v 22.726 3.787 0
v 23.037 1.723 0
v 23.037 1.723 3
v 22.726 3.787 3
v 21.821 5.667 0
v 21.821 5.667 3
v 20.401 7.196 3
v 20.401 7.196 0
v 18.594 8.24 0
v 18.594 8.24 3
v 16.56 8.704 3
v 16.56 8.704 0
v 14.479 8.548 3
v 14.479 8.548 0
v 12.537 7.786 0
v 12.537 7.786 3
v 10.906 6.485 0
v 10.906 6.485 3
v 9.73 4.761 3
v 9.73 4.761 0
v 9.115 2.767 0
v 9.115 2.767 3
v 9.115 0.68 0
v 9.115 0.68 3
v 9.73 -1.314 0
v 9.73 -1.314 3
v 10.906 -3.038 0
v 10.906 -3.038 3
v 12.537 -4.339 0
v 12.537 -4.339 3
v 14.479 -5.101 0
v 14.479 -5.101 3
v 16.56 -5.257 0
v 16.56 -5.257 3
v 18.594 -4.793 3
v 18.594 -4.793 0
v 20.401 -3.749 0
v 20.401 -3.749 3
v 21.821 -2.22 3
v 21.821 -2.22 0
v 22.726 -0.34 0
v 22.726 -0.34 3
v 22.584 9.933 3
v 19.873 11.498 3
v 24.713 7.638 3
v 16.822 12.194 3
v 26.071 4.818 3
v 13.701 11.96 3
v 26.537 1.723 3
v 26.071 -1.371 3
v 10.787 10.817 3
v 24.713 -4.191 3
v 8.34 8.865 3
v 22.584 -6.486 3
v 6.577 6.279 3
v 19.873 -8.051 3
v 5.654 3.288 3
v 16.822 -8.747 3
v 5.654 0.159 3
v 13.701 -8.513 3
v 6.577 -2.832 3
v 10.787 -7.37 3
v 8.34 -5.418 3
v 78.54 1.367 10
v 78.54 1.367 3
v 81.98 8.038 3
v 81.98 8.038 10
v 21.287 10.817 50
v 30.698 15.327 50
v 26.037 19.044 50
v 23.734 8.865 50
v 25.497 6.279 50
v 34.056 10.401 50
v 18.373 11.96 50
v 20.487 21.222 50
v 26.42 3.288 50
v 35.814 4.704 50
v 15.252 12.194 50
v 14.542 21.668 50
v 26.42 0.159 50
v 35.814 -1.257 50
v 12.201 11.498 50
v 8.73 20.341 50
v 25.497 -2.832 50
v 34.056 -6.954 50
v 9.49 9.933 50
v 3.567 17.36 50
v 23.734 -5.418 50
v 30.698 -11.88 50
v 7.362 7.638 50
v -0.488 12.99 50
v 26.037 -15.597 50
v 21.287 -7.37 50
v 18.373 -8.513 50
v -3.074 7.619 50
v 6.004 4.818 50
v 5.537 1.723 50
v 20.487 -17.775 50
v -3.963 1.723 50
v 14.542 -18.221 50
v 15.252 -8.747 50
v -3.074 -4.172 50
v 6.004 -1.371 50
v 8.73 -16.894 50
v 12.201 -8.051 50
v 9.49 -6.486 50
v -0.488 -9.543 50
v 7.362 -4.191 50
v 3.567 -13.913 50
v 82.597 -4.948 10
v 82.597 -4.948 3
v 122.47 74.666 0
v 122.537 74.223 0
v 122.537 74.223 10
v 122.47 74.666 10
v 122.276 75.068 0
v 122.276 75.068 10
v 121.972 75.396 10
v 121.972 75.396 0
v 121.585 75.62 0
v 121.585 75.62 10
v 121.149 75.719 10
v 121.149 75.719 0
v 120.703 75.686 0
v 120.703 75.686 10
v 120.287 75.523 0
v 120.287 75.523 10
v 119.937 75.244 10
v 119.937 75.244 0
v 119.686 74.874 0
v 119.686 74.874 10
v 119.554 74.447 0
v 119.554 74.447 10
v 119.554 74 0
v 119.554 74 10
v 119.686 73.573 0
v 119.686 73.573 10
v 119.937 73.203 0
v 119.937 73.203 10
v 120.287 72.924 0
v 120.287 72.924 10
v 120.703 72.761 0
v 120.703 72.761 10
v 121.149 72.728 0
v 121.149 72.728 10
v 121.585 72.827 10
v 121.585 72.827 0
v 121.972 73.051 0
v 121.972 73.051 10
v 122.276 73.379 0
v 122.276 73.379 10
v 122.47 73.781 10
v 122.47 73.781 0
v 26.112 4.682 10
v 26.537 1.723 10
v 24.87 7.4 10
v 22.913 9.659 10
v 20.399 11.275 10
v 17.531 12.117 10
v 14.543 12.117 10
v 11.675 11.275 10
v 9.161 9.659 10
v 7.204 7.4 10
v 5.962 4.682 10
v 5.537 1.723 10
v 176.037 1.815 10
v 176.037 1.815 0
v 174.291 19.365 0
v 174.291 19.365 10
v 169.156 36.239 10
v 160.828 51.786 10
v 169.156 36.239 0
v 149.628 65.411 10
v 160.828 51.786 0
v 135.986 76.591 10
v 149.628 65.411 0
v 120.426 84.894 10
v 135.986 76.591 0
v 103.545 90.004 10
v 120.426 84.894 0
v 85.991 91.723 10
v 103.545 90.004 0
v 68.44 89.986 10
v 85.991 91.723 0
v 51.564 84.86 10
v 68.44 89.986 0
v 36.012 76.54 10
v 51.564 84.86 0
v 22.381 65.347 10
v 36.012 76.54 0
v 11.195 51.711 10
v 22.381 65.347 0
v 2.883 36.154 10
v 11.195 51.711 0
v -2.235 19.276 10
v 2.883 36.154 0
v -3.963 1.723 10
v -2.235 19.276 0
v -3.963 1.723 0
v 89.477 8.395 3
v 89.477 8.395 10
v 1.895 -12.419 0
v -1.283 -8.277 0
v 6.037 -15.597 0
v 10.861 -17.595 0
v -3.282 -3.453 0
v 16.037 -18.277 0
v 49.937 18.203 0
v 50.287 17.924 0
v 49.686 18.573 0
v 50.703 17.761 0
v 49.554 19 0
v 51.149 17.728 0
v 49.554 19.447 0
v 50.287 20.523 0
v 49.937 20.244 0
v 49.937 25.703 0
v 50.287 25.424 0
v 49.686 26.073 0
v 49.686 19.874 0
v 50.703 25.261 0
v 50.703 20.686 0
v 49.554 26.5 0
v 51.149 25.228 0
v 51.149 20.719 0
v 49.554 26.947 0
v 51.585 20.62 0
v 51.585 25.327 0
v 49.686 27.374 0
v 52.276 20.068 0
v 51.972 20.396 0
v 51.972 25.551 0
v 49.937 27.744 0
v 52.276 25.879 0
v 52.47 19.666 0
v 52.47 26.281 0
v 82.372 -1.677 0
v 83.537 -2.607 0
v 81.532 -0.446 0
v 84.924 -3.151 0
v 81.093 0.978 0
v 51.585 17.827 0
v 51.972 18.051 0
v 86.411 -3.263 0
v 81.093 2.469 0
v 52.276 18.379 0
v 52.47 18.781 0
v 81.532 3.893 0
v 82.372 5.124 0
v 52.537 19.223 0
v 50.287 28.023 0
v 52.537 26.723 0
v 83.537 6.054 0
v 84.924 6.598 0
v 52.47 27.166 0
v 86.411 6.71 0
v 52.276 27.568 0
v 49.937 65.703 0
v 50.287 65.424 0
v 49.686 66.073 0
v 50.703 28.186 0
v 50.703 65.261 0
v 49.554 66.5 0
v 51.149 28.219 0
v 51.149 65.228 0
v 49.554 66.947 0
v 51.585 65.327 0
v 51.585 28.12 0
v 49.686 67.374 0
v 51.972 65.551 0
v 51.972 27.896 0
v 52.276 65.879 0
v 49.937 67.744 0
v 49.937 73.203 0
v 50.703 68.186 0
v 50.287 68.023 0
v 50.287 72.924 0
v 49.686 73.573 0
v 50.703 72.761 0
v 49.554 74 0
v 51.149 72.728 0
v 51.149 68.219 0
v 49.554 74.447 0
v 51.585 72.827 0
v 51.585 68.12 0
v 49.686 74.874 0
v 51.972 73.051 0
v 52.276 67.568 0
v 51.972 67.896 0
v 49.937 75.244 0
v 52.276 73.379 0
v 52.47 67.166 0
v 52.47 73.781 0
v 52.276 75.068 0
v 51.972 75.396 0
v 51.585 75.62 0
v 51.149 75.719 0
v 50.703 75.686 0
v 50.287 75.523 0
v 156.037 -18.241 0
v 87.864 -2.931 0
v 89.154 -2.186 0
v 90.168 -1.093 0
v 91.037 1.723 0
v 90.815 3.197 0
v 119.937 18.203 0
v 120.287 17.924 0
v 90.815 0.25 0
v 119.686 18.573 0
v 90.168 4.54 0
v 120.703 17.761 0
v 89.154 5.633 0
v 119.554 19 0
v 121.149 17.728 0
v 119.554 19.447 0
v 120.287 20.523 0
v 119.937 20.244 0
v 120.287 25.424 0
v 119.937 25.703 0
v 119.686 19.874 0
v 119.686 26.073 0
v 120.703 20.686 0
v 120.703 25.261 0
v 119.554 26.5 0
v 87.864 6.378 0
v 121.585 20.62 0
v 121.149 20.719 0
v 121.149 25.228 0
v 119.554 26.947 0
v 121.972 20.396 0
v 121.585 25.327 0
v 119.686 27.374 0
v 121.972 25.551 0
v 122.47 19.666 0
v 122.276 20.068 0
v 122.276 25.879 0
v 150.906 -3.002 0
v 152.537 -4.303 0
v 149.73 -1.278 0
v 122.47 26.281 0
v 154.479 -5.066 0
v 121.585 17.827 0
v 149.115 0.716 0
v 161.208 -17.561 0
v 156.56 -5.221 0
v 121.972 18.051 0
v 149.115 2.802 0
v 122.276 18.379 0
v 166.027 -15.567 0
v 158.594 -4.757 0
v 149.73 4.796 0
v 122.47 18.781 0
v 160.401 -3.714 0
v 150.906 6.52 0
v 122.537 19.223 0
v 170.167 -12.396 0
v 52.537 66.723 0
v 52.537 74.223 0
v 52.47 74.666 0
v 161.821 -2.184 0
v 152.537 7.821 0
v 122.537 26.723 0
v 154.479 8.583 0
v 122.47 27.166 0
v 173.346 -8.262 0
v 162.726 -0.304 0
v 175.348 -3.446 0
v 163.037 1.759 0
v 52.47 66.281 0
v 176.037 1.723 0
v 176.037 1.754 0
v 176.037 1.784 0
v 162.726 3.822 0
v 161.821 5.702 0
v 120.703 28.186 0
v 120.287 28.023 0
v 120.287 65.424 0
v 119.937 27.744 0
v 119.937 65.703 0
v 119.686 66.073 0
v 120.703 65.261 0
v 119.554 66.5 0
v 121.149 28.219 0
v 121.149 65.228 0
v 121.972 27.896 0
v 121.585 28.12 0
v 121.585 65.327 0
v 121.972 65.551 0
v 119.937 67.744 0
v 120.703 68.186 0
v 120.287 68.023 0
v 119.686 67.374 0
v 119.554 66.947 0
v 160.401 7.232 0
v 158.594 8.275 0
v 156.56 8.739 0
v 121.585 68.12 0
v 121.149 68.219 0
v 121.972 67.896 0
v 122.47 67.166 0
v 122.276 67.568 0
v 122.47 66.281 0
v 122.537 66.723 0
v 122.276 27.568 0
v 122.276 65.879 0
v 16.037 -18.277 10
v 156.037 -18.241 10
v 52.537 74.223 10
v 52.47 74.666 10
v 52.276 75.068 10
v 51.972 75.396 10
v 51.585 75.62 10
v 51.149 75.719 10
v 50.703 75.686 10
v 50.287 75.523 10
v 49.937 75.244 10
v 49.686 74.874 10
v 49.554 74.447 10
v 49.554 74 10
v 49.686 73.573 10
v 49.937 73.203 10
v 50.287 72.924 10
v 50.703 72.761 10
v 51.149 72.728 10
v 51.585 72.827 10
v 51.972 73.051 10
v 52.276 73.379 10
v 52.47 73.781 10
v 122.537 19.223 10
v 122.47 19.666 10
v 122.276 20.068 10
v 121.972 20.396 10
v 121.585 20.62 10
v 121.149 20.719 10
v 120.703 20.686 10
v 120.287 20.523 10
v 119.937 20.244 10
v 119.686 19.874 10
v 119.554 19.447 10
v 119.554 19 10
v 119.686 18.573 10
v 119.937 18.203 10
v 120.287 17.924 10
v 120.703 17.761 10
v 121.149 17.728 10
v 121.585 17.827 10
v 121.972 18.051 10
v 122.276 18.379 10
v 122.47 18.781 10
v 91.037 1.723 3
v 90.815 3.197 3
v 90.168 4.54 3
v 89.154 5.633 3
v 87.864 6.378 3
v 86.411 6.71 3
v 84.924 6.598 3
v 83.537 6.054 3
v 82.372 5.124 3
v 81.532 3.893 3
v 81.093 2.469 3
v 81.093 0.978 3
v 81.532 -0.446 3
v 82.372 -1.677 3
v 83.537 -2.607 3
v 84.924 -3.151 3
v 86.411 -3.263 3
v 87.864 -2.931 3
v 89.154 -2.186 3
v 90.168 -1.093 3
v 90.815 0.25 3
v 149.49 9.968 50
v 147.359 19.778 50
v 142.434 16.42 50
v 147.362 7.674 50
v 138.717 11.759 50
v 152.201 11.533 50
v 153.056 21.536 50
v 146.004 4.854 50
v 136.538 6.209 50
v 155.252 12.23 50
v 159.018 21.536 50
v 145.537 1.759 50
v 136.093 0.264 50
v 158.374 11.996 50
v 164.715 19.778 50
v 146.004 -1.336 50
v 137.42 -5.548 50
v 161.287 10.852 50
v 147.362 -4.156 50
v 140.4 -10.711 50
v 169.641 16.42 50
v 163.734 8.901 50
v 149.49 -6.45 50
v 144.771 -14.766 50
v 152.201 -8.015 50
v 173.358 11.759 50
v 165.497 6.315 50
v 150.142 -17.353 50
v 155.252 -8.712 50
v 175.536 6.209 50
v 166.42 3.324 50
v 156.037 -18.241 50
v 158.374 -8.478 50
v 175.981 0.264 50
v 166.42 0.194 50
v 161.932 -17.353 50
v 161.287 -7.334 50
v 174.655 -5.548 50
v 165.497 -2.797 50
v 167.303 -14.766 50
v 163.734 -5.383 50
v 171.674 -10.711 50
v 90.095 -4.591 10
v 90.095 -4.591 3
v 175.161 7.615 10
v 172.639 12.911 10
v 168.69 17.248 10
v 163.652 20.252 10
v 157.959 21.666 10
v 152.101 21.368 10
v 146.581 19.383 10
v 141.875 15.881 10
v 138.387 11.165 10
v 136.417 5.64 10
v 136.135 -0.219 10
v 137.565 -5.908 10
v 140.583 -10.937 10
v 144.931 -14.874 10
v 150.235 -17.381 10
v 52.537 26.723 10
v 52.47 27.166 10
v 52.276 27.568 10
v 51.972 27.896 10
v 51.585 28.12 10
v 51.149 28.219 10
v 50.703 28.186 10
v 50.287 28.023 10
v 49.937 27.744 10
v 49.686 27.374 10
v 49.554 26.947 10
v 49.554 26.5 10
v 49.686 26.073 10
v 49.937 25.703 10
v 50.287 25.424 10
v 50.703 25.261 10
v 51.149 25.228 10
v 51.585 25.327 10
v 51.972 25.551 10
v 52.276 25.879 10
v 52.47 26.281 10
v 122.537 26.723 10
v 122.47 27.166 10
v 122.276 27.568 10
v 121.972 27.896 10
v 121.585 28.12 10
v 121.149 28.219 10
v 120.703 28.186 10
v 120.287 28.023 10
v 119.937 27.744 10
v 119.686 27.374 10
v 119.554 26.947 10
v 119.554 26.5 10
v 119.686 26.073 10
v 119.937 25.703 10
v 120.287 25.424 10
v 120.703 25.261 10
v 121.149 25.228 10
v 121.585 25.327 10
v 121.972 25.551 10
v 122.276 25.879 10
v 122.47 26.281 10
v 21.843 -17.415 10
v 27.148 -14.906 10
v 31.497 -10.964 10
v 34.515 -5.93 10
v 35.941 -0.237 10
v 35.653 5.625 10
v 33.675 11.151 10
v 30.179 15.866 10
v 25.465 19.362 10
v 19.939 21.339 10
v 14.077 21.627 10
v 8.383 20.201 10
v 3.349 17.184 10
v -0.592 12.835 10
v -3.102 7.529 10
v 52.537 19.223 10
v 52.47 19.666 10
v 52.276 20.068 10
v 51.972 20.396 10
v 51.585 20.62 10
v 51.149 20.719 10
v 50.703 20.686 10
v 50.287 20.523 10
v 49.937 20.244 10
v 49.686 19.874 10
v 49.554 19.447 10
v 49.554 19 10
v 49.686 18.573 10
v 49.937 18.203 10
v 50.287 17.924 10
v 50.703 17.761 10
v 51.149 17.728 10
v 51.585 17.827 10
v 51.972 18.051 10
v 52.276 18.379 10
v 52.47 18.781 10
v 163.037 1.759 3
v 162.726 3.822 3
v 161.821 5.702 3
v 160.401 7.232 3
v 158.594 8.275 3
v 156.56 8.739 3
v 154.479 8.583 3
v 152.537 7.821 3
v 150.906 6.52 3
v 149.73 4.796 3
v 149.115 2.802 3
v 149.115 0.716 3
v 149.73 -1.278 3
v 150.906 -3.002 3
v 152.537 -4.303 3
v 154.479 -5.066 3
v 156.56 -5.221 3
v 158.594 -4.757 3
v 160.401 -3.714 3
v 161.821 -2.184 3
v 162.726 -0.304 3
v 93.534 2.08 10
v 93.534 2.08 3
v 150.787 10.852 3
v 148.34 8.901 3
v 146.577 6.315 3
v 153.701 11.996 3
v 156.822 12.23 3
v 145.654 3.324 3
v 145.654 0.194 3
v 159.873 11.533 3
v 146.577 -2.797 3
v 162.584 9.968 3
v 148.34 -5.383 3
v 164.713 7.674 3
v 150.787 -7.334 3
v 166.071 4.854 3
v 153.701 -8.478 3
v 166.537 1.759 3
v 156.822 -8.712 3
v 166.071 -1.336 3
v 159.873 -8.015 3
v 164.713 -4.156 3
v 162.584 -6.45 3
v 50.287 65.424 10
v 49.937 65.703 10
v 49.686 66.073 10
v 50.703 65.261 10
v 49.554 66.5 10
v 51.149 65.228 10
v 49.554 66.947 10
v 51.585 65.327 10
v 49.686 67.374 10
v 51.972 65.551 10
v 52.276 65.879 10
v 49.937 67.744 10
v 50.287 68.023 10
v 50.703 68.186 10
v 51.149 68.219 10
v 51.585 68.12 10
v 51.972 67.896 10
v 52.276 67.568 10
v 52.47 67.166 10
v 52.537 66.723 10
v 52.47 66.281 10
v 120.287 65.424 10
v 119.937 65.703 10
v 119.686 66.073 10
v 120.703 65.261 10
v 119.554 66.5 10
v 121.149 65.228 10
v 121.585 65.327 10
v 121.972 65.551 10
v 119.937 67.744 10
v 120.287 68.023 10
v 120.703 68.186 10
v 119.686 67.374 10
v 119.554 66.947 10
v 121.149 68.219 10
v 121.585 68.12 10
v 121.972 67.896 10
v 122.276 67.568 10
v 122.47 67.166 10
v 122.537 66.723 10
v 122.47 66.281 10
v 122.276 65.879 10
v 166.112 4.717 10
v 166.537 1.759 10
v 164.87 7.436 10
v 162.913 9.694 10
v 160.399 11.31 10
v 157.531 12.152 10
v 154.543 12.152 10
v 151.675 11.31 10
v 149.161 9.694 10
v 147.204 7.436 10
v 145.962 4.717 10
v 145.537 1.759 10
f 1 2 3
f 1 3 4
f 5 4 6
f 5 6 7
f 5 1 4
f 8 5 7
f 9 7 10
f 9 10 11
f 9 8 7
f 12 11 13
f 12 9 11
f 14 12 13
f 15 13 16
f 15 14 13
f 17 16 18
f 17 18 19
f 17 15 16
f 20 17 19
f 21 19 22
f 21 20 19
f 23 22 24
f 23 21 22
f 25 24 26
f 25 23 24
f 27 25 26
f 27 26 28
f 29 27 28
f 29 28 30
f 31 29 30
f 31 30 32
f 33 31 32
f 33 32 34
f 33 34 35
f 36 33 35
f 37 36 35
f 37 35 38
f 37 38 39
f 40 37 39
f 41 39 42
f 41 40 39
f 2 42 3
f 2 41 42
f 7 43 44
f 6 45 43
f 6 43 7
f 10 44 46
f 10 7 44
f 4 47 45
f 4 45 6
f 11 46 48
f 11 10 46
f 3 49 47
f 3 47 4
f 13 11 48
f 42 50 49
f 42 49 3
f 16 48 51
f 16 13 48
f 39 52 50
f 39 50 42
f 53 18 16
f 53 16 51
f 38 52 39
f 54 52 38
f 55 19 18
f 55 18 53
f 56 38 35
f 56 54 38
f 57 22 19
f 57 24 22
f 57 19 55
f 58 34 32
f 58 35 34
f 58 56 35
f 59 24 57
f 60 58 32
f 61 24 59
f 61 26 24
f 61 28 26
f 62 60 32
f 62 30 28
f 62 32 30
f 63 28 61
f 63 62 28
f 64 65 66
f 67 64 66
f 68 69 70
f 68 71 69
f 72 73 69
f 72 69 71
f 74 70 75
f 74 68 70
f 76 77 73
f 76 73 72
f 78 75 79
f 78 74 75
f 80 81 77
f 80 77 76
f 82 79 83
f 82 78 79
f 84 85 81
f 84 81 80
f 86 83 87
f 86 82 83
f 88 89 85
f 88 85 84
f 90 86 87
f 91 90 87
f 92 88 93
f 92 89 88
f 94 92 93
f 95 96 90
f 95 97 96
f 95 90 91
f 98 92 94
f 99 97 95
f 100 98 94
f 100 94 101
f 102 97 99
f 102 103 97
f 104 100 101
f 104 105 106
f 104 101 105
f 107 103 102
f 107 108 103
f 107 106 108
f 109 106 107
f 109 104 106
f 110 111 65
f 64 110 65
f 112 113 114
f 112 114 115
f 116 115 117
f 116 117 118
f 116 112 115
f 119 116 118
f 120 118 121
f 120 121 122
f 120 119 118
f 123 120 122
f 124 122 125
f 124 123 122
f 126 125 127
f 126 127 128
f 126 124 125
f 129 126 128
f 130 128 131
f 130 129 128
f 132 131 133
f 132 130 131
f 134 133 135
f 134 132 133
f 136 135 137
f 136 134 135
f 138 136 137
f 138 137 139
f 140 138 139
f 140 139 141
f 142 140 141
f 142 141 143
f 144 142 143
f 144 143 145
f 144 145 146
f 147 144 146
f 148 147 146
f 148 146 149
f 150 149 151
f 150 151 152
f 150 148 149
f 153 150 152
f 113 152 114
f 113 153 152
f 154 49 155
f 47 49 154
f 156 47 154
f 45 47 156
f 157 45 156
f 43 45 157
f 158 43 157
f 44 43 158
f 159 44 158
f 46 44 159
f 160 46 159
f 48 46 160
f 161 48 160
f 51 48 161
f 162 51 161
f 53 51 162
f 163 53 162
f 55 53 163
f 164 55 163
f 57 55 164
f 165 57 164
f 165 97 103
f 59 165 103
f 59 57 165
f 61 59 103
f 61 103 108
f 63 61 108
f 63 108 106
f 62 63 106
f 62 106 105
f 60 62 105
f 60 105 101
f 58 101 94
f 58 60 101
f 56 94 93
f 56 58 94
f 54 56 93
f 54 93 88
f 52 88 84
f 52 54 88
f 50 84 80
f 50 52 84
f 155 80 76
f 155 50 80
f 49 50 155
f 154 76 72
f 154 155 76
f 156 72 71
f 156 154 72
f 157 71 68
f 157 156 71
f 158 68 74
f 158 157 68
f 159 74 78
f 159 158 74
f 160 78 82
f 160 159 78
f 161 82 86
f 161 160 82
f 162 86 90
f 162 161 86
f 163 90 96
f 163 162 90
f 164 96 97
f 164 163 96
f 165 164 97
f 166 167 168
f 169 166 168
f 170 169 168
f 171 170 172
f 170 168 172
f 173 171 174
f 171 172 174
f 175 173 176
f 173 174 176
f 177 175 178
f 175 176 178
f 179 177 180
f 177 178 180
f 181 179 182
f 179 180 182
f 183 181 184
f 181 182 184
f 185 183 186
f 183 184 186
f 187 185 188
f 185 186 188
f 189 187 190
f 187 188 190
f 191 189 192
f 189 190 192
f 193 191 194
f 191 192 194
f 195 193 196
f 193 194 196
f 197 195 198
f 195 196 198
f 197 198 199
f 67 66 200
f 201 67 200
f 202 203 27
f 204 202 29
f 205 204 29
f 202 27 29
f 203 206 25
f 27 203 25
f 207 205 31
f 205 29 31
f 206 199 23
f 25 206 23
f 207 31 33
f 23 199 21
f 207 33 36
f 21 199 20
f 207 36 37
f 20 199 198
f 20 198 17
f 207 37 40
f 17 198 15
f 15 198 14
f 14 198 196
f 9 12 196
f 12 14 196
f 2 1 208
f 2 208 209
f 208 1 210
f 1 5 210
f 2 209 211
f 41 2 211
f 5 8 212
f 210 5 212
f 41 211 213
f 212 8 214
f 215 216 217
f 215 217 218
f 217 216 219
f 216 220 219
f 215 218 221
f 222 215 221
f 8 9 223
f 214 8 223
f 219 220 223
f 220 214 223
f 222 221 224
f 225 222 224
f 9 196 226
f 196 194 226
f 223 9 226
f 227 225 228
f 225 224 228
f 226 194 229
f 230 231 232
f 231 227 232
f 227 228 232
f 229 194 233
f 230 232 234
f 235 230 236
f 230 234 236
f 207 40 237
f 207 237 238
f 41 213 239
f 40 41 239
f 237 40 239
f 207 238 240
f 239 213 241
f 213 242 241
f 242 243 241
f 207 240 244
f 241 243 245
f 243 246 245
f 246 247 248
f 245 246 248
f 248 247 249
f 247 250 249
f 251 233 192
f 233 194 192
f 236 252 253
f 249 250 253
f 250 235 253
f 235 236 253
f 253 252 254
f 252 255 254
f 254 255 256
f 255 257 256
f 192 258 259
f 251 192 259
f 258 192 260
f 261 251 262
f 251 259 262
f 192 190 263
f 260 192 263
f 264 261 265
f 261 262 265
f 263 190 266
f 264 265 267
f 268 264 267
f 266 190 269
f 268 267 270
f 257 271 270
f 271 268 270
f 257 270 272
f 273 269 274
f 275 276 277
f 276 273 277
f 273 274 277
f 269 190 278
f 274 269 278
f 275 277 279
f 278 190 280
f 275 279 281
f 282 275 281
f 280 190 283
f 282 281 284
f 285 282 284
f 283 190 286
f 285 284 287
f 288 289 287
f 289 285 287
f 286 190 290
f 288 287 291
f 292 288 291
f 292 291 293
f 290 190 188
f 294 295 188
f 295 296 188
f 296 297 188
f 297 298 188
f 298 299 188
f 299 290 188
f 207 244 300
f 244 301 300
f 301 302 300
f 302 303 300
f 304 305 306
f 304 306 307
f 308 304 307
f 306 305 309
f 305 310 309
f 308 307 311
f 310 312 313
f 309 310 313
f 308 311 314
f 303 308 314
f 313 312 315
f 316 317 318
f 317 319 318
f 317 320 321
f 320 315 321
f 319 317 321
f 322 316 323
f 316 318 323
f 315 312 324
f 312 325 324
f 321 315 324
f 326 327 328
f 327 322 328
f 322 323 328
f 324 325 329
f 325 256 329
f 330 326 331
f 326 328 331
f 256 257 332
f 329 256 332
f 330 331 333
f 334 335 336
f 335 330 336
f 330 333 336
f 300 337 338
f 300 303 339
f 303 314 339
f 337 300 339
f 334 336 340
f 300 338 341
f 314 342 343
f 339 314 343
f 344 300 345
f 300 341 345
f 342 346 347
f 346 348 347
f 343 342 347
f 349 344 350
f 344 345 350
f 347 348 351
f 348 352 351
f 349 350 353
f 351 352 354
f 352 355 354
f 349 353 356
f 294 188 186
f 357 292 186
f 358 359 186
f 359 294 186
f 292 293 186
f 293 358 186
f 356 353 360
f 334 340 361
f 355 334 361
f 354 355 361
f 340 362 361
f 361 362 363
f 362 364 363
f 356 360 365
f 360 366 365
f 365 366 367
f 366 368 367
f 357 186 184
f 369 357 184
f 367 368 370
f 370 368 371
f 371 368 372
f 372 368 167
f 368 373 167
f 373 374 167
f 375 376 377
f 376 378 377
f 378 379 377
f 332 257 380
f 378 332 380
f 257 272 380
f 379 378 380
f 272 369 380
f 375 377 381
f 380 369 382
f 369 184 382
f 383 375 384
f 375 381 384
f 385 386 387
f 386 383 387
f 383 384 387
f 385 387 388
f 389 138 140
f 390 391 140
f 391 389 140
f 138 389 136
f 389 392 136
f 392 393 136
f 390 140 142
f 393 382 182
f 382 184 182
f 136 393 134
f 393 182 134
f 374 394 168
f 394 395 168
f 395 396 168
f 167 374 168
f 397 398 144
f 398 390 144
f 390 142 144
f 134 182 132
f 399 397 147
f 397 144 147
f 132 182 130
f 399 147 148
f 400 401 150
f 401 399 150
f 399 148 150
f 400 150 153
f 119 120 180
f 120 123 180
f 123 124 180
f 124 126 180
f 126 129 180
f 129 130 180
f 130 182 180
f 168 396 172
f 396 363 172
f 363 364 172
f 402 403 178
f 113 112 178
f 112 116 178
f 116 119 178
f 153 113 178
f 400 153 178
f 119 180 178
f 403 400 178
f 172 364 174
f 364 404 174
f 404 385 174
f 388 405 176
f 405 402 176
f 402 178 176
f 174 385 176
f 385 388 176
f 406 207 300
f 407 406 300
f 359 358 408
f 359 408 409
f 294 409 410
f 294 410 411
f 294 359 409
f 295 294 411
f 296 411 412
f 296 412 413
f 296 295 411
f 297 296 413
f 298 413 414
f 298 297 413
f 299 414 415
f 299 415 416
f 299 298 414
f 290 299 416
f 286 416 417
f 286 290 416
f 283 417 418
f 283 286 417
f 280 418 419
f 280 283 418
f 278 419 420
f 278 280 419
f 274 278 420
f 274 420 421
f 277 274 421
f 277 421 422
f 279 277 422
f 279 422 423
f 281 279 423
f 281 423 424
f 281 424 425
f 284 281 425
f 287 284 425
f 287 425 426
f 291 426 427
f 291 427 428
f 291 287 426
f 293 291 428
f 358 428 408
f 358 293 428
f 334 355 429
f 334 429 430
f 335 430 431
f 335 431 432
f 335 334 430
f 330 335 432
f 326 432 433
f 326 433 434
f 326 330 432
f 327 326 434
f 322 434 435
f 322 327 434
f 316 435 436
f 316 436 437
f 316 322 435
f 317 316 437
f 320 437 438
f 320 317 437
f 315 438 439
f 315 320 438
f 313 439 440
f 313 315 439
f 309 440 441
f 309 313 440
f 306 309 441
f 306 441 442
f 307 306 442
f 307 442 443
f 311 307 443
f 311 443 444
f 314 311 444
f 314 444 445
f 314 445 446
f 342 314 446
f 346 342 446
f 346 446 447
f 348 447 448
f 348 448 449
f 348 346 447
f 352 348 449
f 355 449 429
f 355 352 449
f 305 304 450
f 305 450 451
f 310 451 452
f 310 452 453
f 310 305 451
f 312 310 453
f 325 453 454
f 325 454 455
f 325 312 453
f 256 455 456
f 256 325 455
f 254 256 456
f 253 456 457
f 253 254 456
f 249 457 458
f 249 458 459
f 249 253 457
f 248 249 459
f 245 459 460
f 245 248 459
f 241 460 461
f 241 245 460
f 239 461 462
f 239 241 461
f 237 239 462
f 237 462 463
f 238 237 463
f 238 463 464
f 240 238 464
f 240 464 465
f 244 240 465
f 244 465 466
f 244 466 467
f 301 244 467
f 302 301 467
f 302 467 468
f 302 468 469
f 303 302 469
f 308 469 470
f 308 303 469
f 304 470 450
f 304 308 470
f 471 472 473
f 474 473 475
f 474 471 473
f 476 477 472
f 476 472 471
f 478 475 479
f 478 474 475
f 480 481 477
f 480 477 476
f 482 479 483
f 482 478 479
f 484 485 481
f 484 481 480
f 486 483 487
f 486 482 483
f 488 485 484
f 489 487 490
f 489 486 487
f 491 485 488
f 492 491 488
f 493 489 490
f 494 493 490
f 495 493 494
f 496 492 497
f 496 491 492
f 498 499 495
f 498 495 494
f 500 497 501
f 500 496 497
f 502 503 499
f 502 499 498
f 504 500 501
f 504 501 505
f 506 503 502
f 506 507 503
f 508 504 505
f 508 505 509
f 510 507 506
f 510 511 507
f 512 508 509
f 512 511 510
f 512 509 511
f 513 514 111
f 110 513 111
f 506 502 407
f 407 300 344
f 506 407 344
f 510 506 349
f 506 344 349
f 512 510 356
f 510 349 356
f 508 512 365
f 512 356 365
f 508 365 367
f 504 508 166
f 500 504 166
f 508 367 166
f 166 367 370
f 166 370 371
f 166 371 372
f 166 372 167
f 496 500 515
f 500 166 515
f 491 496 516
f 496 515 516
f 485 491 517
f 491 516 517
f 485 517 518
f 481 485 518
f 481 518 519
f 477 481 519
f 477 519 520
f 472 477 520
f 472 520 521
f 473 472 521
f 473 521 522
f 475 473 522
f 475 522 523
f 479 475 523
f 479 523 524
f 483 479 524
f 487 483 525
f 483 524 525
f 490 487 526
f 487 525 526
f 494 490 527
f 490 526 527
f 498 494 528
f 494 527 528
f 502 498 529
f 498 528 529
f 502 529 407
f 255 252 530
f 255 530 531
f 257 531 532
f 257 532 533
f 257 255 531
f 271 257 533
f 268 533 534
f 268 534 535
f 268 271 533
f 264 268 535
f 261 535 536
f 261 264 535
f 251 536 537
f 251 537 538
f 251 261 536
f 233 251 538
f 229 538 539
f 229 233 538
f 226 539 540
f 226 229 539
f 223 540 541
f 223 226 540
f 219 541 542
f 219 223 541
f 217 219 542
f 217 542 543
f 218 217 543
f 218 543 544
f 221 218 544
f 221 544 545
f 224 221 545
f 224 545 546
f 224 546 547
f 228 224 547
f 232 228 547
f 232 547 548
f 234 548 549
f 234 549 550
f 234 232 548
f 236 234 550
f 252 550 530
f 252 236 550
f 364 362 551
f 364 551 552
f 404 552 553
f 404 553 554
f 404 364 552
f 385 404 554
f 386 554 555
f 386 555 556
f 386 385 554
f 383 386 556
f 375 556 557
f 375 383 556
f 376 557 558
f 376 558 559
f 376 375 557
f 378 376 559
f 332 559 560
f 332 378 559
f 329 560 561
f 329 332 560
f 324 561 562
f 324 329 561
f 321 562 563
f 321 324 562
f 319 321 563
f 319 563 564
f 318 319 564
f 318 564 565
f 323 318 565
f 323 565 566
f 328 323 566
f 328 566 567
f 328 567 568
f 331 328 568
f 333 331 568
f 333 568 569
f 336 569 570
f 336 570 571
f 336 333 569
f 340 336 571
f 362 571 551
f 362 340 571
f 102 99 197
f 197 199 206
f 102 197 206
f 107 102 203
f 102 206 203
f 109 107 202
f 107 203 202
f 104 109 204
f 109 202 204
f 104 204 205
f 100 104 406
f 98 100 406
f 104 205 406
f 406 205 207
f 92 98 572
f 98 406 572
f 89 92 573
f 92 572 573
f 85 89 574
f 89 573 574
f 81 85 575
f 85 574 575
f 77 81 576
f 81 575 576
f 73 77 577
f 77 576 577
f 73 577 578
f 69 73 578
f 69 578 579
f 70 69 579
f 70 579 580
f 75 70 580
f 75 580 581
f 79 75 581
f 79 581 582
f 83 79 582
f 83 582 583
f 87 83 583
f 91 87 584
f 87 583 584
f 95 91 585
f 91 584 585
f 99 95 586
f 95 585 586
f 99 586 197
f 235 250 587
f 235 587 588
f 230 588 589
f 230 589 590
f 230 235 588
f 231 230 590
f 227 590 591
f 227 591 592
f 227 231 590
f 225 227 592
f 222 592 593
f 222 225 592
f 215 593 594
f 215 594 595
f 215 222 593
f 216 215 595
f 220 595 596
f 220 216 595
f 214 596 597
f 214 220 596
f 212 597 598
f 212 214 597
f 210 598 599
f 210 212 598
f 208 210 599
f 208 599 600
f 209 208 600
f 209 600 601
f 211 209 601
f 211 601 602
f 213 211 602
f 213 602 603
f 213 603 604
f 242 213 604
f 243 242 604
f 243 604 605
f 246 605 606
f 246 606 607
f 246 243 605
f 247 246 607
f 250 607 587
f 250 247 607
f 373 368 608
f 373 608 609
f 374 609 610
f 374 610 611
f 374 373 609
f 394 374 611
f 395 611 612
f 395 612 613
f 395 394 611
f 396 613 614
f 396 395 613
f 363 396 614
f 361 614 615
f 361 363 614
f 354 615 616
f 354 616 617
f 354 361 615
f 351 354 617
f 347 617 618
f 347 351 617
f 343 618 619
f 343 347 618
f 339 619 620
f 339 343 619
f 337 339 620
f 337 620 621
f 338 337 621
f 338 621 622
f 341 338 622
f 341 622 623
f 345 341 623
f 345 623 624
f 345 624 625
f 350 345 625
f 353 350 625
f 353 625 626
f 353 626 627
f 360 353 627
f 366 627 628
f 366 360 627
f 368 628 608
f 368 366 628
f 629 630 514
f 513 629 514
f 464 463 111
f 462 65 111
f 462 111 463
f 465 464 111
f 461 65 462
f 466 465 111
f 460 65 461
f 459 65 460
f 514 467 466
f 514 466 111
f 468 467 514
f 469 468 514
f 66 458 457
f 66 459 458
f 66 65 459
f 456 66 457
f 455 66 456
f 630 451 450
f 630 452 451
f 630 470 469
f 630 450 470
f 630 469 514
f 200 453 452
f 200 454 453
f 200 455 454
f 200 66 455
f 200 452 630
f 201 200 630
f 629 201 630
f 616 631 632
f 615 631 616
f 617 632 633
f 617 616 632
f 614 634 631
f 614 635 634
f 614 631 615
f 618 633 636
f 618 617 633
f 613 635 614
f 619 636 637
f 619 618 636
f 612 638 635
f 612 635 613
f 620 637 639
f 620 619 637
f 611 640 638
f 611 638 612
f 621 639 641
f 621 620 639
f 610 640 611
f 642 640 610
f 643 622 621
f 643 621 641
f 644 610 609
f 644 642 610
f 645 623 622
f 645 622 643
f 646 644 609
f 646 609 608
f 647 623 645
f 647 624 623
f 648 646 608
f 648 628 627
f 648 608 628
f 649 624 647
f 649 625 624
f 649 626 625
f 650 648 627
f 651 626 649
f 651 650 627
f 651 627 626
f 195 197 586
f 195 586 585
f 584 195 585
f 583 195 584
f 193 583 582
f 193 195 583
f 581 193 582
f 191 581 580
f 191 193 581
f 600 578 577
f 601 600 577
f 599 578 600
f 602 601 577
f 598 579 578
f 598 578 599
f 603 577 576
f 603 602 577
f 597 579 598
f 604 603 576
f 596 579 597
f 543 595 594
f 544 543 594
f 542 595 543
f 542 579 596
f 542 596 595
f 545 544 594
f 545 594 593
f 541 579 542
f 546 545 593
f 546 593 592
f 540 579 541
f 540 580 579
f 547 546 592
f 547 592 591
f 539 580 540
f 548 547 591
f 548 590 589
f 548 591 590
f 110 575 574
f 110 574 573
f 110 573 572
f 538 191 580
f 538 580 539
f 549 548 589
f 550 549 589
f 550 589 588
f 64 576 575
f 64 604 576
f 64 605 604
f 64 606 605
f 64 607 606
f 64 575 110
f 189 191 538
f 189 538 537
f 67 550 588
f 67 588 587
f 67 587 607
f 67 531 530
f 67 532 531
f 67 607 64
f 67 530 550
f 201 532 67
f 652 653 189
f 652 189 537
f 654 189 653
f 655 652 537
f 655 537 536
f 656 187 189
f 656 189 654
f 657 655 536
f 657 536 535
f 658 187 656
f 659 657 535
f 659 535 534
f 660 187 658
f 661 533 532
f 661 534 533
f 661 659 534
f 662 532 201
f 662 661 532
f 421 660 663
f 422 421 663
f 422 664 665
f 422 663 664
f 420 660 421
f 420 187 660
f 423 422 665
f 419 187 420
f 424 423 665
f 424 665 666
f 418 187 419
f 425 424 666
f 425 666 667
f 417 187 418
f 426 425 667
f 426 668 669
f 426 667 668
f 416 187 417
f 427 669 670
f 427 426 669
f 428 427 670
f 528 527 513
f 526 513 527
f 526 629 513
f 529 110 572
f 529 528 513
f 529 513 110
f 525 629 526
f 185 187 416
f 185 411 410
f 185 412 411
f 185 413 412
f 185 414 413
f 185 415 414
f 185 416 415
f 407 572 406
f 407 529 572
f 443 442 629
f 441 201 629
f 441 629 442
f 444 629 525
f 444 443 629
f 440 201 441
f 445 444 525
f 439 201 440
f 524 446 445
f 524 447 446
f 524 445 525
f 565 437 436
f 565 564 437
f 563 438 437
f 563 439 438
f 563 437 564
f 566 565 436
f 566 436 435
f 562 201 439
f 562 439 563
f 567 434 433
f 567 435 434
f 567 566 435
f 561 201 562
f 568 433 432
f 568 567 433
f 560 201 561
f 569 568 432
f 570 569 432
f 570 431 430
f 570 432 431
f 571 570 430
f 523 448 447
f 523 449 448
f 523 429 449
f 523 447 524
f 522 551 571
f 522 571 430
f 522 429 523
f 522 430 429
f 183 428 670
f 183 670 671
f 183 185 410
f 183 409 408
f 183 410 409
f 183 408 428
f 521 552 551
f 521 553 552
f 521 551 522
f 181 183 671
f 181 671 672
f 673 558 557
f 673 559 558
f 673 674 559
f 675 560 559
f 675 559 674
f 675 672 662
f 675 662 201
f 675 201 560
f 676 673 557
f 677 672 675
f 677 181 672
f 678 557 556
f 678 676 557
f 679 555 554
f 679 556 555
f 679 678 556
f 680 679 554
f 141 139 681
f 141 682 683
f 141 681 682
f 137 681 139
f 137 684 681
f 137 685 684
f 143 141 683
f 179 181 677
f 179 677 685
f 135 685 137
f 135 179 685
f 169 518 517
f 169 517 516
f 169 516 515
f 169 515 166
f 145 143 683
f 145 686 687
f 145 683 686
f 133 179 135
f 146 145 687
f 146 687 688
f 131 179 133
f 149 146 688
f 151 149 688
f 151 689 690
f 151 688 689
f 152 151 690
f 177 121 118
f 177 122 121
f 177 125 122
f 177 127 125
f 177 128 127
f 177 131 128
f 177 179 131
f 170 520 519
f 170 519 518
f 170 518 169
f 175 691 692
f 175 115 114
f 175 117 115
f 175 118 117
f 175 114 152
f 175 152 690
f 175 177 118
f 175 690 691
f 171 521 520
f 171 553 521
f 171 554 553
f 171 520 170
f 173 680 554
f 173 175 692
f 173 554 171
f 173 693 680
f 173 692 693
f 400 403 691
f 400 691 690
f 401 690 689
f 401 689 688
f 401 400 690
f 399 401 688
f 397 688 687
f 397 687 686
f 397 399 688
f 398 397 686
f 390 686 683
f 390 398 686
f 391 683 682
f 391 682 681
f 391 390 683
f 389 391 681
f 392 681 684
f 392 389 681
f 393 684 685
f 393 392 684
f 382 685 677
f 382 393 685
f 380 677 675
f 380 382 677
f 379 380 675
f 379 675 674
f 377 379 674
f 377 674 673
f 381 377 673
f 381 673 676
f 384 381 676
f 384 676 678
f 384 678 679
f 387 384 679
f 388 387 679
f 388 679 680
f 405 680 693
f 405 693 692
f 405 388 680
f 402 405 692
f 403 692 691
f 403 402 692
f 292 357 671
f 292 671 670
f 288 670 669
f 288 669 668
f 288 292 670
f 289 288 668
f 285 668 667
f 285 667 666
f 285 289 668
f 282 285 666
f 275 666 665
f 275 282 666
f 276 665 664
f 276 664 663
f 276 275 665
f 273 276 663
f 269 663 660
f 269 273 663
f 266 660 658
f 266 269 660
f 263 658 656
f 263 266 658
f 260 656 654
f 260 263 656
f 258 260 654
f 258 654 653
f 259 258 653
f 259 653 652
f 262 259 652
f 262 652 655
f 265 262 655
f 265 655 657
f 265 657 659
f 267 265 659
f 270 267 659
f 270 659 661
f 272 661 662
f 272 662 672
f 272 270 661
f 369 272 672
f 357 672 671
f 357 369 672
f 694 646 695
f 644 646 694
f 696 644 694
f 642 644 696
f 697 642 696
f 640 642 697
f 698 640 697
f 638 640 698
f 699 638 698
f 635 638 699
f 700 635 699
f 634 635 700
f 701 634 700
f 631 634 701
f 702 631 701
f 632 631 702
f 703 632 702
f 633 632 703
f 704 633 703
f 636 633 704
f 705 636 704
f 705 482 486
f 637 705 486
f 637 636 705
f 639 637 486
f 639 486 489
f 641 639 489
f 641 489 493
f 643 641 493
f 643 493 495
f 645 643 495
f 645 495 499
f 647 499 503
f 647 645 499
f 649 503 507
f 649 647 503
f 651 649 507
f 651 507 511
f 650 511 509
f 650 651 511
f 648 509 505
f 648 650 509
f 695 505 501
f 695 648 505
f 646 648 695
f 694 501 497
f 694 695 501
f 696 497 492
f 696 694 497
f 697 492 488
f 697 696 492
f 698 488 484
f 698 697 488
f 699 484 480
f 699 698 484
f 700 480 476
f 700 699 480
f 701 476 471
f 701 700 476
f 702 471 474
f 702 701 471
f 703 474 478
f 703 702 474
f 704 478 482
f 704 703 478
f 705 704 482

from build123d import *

# Parameters (mm, degrees)
BOSS_EXTRUDE8_OUTLINE_R   = 10.5
BOSS_EXTRUDE8_OUTLINE_R_2 = 1.5
BOSS_EXTRUDE8_DEPTH       = 10
SKETCH5_R                 = 10
SKETCH5_R_2               = 5
BOSS_EXTRUDE10_DEPTH      = 3
SKETCH7_R                 = 20
SKETCH7_R_2               = 10.5
BOSS_EXTRUDE11_DEPTH      = 50
SKETCH8_R                 = 20
SKETCH8_R_2               = 7
BOSS_EXTRUDE13_DEPTH      = 3


with BuildPart() as part:
    # Boss-Extrude8: read off the stored shape, not the designer's step
    # Boss-Extrude8 outline → Boss-Extrude8 (new body)
    with BuildSketch(Plane.XY):
        with BuildLine():
            ThreePointArc((176.037015378, 1.723482717), (86.037015378, 91.723482717), (-3.962984622, 1.723482717))
            ThreePointArc((-3.962984622, 1.723482717), (1.894879754, -12.418652907), (16.037015378, -18.276517283))
            Line((16.037015378, -18.276517283), (156.037046796, -18.241067052))
            ThreePointArc((156.037046796, -18.241067052), (170.166643311, -12.395730676), (176.037015378, 1.723482717))
        make_face()
        with Locations((16.037015378, 1.723482717)):
            Circle(BOSS_EXTRUDE8_OUTLINE_R, mode=Mode.SUBTRACT)
        Polygon((81.979520172, 8.037757496), (89.47659014, 8.394514031), (93.534085346, 2.080239251), (90.094510583, -4.590792062), (82.597440615, -4.947548597), (78.539945409, 1.366726183), align=None, mode=Mode.SUBTRACT)
        with Locations((51.037015378, 19.223482717)):
            Circle(BOSS_EXTRUDE8_OUTLINE_R_2, mode=Mode.SUBTRACT)
        with Locations((51.037015378, 26.723482717)):
            Circle(BOSS_EXTRUDE8_OUTLINE_R_2, mode=Mode.SUBTRACT)
        with Locations((156.037046796, 1.758932948)):
            Circle(BOSS_EXTRUDE8_OUTLINE_R, mode=Mode.SUBTRACT)
        with Locations((121.037015378, 19.223482717)):
            Circle(BOSS_EXTRUDE8_OUTLINE_R_2, mode=Mode.SUBTRACT)
        with Locations((121.037015378, 26.723482717)):
            Circle(BOSS_EXTRUDE8_OUTLINE_R_2, mode=Mode.SUBTRACT)
        with Locations((51.037015378, 66.723482717)):
            Circle(BOSS_EXTRUDE8_OUTLINE_R_2, mode=Mode.SUBTRACT)
        with Locations((51.037015378, 74.223482717)):
            Circle(BOSS_EXTRUDE8_OUTLINE_R_2, mode=Mode.SUBTRACT)
        with Locations((121.037015378, 66.723482717)):
            Circle(BOSS_EXTRUDE8_OUTLINE_R_2, mode=Mode.SUBTRACT)
        with Locations((121.037015378, 74.223482717)):
            Circle(BOSS_EXTRUDE8_OUTLINE_R_2, mode=Mode.SUBTRACT)
    extrude(amount=BOSS_EXTRUDE8_DEPTH)

    # Sketch5 → Boss-Extrude10 (add)
    with BuildSketch(Plane.XY):
        with Locations((86.037015378, 1.723482717)):
            Circle(SKETCH5_R)
        with Locations((86.037015378, 1.723482717)):
            Circle(SKETCH5_R_2, mode=Mode.SUBTRACT)
    extrude(amount=BOSS_EXTRUDE10_DEPTH)


with BuildPart() as boss_extrude11_tool:
    # Sketch7 → Boss-Extrude11 (new body)
    # profile 1 of 2: a face of its own
    with BuildSketch(Plane.XY):
        with Locations(Location((156.037046796, 1.758932948, 0), (0, 0, 270))):
            Circle(SKETCH7_R)
        with Locations(Location((156.037046796, 1.758932948, 0), (0, 0, 180))):
            Circle(SKETCH7_R_2, mode=Mode.SUBTRACT)
    # profile 2 of 2: a face of its own
    with BuildSketch(Plane.XY):
        with Locations(Location((16.037015378, 1.723482717, 0), (0, 0, 180))):
            Circle(SKETCH7_R)
        with Locations(Location((16.037015378, 1.723482717, 0), (0, 0, 180))):
            Circle(SKETCH7_R_2, mode=Mode.SUBTRACT)
    extrude(amount=BOSS_EXTRUDE11_DEPTH)


with BuildPart() as part_1:
    add(part.part)


with BuildPart() as part_2:
    # Boss-Extrude11: joined with boss_extrude11_tool
    add(part_1.part.fuse(boss_extrude11_tool.part, tol=0.00001))

    # Sketch8 → Boss-Extrude13 (add)
    # profile 1 of 2: a face of its own
    with BuildSketch(Plane.XY):
        with Locations(Location((16.037015378, 1.723482717, 0), (0, 0, 180))):
            Circle(SKETCH8_R)
        with Locations((16.037015378, 1.723482717)):
            Circle(SKETCH8_R_2, mode=Mode.SUBTRACT)
    # profile 2 of 2: a face of its own
    with BuildSketch(Plane.XY):
        with Locations(Location((156.037046796, 1.758932948, 0), (0, 0, 270))):
            Circle(SKETCH8_R)
        with Locations((156.037046796, 1.758932948)):
            Circle(SKETCH8_R_2, mode=Mode.SUBTRACT)
    extrude(amount=BOSS_EXTRUDE13_DEPTH)


solid = part_2.part
